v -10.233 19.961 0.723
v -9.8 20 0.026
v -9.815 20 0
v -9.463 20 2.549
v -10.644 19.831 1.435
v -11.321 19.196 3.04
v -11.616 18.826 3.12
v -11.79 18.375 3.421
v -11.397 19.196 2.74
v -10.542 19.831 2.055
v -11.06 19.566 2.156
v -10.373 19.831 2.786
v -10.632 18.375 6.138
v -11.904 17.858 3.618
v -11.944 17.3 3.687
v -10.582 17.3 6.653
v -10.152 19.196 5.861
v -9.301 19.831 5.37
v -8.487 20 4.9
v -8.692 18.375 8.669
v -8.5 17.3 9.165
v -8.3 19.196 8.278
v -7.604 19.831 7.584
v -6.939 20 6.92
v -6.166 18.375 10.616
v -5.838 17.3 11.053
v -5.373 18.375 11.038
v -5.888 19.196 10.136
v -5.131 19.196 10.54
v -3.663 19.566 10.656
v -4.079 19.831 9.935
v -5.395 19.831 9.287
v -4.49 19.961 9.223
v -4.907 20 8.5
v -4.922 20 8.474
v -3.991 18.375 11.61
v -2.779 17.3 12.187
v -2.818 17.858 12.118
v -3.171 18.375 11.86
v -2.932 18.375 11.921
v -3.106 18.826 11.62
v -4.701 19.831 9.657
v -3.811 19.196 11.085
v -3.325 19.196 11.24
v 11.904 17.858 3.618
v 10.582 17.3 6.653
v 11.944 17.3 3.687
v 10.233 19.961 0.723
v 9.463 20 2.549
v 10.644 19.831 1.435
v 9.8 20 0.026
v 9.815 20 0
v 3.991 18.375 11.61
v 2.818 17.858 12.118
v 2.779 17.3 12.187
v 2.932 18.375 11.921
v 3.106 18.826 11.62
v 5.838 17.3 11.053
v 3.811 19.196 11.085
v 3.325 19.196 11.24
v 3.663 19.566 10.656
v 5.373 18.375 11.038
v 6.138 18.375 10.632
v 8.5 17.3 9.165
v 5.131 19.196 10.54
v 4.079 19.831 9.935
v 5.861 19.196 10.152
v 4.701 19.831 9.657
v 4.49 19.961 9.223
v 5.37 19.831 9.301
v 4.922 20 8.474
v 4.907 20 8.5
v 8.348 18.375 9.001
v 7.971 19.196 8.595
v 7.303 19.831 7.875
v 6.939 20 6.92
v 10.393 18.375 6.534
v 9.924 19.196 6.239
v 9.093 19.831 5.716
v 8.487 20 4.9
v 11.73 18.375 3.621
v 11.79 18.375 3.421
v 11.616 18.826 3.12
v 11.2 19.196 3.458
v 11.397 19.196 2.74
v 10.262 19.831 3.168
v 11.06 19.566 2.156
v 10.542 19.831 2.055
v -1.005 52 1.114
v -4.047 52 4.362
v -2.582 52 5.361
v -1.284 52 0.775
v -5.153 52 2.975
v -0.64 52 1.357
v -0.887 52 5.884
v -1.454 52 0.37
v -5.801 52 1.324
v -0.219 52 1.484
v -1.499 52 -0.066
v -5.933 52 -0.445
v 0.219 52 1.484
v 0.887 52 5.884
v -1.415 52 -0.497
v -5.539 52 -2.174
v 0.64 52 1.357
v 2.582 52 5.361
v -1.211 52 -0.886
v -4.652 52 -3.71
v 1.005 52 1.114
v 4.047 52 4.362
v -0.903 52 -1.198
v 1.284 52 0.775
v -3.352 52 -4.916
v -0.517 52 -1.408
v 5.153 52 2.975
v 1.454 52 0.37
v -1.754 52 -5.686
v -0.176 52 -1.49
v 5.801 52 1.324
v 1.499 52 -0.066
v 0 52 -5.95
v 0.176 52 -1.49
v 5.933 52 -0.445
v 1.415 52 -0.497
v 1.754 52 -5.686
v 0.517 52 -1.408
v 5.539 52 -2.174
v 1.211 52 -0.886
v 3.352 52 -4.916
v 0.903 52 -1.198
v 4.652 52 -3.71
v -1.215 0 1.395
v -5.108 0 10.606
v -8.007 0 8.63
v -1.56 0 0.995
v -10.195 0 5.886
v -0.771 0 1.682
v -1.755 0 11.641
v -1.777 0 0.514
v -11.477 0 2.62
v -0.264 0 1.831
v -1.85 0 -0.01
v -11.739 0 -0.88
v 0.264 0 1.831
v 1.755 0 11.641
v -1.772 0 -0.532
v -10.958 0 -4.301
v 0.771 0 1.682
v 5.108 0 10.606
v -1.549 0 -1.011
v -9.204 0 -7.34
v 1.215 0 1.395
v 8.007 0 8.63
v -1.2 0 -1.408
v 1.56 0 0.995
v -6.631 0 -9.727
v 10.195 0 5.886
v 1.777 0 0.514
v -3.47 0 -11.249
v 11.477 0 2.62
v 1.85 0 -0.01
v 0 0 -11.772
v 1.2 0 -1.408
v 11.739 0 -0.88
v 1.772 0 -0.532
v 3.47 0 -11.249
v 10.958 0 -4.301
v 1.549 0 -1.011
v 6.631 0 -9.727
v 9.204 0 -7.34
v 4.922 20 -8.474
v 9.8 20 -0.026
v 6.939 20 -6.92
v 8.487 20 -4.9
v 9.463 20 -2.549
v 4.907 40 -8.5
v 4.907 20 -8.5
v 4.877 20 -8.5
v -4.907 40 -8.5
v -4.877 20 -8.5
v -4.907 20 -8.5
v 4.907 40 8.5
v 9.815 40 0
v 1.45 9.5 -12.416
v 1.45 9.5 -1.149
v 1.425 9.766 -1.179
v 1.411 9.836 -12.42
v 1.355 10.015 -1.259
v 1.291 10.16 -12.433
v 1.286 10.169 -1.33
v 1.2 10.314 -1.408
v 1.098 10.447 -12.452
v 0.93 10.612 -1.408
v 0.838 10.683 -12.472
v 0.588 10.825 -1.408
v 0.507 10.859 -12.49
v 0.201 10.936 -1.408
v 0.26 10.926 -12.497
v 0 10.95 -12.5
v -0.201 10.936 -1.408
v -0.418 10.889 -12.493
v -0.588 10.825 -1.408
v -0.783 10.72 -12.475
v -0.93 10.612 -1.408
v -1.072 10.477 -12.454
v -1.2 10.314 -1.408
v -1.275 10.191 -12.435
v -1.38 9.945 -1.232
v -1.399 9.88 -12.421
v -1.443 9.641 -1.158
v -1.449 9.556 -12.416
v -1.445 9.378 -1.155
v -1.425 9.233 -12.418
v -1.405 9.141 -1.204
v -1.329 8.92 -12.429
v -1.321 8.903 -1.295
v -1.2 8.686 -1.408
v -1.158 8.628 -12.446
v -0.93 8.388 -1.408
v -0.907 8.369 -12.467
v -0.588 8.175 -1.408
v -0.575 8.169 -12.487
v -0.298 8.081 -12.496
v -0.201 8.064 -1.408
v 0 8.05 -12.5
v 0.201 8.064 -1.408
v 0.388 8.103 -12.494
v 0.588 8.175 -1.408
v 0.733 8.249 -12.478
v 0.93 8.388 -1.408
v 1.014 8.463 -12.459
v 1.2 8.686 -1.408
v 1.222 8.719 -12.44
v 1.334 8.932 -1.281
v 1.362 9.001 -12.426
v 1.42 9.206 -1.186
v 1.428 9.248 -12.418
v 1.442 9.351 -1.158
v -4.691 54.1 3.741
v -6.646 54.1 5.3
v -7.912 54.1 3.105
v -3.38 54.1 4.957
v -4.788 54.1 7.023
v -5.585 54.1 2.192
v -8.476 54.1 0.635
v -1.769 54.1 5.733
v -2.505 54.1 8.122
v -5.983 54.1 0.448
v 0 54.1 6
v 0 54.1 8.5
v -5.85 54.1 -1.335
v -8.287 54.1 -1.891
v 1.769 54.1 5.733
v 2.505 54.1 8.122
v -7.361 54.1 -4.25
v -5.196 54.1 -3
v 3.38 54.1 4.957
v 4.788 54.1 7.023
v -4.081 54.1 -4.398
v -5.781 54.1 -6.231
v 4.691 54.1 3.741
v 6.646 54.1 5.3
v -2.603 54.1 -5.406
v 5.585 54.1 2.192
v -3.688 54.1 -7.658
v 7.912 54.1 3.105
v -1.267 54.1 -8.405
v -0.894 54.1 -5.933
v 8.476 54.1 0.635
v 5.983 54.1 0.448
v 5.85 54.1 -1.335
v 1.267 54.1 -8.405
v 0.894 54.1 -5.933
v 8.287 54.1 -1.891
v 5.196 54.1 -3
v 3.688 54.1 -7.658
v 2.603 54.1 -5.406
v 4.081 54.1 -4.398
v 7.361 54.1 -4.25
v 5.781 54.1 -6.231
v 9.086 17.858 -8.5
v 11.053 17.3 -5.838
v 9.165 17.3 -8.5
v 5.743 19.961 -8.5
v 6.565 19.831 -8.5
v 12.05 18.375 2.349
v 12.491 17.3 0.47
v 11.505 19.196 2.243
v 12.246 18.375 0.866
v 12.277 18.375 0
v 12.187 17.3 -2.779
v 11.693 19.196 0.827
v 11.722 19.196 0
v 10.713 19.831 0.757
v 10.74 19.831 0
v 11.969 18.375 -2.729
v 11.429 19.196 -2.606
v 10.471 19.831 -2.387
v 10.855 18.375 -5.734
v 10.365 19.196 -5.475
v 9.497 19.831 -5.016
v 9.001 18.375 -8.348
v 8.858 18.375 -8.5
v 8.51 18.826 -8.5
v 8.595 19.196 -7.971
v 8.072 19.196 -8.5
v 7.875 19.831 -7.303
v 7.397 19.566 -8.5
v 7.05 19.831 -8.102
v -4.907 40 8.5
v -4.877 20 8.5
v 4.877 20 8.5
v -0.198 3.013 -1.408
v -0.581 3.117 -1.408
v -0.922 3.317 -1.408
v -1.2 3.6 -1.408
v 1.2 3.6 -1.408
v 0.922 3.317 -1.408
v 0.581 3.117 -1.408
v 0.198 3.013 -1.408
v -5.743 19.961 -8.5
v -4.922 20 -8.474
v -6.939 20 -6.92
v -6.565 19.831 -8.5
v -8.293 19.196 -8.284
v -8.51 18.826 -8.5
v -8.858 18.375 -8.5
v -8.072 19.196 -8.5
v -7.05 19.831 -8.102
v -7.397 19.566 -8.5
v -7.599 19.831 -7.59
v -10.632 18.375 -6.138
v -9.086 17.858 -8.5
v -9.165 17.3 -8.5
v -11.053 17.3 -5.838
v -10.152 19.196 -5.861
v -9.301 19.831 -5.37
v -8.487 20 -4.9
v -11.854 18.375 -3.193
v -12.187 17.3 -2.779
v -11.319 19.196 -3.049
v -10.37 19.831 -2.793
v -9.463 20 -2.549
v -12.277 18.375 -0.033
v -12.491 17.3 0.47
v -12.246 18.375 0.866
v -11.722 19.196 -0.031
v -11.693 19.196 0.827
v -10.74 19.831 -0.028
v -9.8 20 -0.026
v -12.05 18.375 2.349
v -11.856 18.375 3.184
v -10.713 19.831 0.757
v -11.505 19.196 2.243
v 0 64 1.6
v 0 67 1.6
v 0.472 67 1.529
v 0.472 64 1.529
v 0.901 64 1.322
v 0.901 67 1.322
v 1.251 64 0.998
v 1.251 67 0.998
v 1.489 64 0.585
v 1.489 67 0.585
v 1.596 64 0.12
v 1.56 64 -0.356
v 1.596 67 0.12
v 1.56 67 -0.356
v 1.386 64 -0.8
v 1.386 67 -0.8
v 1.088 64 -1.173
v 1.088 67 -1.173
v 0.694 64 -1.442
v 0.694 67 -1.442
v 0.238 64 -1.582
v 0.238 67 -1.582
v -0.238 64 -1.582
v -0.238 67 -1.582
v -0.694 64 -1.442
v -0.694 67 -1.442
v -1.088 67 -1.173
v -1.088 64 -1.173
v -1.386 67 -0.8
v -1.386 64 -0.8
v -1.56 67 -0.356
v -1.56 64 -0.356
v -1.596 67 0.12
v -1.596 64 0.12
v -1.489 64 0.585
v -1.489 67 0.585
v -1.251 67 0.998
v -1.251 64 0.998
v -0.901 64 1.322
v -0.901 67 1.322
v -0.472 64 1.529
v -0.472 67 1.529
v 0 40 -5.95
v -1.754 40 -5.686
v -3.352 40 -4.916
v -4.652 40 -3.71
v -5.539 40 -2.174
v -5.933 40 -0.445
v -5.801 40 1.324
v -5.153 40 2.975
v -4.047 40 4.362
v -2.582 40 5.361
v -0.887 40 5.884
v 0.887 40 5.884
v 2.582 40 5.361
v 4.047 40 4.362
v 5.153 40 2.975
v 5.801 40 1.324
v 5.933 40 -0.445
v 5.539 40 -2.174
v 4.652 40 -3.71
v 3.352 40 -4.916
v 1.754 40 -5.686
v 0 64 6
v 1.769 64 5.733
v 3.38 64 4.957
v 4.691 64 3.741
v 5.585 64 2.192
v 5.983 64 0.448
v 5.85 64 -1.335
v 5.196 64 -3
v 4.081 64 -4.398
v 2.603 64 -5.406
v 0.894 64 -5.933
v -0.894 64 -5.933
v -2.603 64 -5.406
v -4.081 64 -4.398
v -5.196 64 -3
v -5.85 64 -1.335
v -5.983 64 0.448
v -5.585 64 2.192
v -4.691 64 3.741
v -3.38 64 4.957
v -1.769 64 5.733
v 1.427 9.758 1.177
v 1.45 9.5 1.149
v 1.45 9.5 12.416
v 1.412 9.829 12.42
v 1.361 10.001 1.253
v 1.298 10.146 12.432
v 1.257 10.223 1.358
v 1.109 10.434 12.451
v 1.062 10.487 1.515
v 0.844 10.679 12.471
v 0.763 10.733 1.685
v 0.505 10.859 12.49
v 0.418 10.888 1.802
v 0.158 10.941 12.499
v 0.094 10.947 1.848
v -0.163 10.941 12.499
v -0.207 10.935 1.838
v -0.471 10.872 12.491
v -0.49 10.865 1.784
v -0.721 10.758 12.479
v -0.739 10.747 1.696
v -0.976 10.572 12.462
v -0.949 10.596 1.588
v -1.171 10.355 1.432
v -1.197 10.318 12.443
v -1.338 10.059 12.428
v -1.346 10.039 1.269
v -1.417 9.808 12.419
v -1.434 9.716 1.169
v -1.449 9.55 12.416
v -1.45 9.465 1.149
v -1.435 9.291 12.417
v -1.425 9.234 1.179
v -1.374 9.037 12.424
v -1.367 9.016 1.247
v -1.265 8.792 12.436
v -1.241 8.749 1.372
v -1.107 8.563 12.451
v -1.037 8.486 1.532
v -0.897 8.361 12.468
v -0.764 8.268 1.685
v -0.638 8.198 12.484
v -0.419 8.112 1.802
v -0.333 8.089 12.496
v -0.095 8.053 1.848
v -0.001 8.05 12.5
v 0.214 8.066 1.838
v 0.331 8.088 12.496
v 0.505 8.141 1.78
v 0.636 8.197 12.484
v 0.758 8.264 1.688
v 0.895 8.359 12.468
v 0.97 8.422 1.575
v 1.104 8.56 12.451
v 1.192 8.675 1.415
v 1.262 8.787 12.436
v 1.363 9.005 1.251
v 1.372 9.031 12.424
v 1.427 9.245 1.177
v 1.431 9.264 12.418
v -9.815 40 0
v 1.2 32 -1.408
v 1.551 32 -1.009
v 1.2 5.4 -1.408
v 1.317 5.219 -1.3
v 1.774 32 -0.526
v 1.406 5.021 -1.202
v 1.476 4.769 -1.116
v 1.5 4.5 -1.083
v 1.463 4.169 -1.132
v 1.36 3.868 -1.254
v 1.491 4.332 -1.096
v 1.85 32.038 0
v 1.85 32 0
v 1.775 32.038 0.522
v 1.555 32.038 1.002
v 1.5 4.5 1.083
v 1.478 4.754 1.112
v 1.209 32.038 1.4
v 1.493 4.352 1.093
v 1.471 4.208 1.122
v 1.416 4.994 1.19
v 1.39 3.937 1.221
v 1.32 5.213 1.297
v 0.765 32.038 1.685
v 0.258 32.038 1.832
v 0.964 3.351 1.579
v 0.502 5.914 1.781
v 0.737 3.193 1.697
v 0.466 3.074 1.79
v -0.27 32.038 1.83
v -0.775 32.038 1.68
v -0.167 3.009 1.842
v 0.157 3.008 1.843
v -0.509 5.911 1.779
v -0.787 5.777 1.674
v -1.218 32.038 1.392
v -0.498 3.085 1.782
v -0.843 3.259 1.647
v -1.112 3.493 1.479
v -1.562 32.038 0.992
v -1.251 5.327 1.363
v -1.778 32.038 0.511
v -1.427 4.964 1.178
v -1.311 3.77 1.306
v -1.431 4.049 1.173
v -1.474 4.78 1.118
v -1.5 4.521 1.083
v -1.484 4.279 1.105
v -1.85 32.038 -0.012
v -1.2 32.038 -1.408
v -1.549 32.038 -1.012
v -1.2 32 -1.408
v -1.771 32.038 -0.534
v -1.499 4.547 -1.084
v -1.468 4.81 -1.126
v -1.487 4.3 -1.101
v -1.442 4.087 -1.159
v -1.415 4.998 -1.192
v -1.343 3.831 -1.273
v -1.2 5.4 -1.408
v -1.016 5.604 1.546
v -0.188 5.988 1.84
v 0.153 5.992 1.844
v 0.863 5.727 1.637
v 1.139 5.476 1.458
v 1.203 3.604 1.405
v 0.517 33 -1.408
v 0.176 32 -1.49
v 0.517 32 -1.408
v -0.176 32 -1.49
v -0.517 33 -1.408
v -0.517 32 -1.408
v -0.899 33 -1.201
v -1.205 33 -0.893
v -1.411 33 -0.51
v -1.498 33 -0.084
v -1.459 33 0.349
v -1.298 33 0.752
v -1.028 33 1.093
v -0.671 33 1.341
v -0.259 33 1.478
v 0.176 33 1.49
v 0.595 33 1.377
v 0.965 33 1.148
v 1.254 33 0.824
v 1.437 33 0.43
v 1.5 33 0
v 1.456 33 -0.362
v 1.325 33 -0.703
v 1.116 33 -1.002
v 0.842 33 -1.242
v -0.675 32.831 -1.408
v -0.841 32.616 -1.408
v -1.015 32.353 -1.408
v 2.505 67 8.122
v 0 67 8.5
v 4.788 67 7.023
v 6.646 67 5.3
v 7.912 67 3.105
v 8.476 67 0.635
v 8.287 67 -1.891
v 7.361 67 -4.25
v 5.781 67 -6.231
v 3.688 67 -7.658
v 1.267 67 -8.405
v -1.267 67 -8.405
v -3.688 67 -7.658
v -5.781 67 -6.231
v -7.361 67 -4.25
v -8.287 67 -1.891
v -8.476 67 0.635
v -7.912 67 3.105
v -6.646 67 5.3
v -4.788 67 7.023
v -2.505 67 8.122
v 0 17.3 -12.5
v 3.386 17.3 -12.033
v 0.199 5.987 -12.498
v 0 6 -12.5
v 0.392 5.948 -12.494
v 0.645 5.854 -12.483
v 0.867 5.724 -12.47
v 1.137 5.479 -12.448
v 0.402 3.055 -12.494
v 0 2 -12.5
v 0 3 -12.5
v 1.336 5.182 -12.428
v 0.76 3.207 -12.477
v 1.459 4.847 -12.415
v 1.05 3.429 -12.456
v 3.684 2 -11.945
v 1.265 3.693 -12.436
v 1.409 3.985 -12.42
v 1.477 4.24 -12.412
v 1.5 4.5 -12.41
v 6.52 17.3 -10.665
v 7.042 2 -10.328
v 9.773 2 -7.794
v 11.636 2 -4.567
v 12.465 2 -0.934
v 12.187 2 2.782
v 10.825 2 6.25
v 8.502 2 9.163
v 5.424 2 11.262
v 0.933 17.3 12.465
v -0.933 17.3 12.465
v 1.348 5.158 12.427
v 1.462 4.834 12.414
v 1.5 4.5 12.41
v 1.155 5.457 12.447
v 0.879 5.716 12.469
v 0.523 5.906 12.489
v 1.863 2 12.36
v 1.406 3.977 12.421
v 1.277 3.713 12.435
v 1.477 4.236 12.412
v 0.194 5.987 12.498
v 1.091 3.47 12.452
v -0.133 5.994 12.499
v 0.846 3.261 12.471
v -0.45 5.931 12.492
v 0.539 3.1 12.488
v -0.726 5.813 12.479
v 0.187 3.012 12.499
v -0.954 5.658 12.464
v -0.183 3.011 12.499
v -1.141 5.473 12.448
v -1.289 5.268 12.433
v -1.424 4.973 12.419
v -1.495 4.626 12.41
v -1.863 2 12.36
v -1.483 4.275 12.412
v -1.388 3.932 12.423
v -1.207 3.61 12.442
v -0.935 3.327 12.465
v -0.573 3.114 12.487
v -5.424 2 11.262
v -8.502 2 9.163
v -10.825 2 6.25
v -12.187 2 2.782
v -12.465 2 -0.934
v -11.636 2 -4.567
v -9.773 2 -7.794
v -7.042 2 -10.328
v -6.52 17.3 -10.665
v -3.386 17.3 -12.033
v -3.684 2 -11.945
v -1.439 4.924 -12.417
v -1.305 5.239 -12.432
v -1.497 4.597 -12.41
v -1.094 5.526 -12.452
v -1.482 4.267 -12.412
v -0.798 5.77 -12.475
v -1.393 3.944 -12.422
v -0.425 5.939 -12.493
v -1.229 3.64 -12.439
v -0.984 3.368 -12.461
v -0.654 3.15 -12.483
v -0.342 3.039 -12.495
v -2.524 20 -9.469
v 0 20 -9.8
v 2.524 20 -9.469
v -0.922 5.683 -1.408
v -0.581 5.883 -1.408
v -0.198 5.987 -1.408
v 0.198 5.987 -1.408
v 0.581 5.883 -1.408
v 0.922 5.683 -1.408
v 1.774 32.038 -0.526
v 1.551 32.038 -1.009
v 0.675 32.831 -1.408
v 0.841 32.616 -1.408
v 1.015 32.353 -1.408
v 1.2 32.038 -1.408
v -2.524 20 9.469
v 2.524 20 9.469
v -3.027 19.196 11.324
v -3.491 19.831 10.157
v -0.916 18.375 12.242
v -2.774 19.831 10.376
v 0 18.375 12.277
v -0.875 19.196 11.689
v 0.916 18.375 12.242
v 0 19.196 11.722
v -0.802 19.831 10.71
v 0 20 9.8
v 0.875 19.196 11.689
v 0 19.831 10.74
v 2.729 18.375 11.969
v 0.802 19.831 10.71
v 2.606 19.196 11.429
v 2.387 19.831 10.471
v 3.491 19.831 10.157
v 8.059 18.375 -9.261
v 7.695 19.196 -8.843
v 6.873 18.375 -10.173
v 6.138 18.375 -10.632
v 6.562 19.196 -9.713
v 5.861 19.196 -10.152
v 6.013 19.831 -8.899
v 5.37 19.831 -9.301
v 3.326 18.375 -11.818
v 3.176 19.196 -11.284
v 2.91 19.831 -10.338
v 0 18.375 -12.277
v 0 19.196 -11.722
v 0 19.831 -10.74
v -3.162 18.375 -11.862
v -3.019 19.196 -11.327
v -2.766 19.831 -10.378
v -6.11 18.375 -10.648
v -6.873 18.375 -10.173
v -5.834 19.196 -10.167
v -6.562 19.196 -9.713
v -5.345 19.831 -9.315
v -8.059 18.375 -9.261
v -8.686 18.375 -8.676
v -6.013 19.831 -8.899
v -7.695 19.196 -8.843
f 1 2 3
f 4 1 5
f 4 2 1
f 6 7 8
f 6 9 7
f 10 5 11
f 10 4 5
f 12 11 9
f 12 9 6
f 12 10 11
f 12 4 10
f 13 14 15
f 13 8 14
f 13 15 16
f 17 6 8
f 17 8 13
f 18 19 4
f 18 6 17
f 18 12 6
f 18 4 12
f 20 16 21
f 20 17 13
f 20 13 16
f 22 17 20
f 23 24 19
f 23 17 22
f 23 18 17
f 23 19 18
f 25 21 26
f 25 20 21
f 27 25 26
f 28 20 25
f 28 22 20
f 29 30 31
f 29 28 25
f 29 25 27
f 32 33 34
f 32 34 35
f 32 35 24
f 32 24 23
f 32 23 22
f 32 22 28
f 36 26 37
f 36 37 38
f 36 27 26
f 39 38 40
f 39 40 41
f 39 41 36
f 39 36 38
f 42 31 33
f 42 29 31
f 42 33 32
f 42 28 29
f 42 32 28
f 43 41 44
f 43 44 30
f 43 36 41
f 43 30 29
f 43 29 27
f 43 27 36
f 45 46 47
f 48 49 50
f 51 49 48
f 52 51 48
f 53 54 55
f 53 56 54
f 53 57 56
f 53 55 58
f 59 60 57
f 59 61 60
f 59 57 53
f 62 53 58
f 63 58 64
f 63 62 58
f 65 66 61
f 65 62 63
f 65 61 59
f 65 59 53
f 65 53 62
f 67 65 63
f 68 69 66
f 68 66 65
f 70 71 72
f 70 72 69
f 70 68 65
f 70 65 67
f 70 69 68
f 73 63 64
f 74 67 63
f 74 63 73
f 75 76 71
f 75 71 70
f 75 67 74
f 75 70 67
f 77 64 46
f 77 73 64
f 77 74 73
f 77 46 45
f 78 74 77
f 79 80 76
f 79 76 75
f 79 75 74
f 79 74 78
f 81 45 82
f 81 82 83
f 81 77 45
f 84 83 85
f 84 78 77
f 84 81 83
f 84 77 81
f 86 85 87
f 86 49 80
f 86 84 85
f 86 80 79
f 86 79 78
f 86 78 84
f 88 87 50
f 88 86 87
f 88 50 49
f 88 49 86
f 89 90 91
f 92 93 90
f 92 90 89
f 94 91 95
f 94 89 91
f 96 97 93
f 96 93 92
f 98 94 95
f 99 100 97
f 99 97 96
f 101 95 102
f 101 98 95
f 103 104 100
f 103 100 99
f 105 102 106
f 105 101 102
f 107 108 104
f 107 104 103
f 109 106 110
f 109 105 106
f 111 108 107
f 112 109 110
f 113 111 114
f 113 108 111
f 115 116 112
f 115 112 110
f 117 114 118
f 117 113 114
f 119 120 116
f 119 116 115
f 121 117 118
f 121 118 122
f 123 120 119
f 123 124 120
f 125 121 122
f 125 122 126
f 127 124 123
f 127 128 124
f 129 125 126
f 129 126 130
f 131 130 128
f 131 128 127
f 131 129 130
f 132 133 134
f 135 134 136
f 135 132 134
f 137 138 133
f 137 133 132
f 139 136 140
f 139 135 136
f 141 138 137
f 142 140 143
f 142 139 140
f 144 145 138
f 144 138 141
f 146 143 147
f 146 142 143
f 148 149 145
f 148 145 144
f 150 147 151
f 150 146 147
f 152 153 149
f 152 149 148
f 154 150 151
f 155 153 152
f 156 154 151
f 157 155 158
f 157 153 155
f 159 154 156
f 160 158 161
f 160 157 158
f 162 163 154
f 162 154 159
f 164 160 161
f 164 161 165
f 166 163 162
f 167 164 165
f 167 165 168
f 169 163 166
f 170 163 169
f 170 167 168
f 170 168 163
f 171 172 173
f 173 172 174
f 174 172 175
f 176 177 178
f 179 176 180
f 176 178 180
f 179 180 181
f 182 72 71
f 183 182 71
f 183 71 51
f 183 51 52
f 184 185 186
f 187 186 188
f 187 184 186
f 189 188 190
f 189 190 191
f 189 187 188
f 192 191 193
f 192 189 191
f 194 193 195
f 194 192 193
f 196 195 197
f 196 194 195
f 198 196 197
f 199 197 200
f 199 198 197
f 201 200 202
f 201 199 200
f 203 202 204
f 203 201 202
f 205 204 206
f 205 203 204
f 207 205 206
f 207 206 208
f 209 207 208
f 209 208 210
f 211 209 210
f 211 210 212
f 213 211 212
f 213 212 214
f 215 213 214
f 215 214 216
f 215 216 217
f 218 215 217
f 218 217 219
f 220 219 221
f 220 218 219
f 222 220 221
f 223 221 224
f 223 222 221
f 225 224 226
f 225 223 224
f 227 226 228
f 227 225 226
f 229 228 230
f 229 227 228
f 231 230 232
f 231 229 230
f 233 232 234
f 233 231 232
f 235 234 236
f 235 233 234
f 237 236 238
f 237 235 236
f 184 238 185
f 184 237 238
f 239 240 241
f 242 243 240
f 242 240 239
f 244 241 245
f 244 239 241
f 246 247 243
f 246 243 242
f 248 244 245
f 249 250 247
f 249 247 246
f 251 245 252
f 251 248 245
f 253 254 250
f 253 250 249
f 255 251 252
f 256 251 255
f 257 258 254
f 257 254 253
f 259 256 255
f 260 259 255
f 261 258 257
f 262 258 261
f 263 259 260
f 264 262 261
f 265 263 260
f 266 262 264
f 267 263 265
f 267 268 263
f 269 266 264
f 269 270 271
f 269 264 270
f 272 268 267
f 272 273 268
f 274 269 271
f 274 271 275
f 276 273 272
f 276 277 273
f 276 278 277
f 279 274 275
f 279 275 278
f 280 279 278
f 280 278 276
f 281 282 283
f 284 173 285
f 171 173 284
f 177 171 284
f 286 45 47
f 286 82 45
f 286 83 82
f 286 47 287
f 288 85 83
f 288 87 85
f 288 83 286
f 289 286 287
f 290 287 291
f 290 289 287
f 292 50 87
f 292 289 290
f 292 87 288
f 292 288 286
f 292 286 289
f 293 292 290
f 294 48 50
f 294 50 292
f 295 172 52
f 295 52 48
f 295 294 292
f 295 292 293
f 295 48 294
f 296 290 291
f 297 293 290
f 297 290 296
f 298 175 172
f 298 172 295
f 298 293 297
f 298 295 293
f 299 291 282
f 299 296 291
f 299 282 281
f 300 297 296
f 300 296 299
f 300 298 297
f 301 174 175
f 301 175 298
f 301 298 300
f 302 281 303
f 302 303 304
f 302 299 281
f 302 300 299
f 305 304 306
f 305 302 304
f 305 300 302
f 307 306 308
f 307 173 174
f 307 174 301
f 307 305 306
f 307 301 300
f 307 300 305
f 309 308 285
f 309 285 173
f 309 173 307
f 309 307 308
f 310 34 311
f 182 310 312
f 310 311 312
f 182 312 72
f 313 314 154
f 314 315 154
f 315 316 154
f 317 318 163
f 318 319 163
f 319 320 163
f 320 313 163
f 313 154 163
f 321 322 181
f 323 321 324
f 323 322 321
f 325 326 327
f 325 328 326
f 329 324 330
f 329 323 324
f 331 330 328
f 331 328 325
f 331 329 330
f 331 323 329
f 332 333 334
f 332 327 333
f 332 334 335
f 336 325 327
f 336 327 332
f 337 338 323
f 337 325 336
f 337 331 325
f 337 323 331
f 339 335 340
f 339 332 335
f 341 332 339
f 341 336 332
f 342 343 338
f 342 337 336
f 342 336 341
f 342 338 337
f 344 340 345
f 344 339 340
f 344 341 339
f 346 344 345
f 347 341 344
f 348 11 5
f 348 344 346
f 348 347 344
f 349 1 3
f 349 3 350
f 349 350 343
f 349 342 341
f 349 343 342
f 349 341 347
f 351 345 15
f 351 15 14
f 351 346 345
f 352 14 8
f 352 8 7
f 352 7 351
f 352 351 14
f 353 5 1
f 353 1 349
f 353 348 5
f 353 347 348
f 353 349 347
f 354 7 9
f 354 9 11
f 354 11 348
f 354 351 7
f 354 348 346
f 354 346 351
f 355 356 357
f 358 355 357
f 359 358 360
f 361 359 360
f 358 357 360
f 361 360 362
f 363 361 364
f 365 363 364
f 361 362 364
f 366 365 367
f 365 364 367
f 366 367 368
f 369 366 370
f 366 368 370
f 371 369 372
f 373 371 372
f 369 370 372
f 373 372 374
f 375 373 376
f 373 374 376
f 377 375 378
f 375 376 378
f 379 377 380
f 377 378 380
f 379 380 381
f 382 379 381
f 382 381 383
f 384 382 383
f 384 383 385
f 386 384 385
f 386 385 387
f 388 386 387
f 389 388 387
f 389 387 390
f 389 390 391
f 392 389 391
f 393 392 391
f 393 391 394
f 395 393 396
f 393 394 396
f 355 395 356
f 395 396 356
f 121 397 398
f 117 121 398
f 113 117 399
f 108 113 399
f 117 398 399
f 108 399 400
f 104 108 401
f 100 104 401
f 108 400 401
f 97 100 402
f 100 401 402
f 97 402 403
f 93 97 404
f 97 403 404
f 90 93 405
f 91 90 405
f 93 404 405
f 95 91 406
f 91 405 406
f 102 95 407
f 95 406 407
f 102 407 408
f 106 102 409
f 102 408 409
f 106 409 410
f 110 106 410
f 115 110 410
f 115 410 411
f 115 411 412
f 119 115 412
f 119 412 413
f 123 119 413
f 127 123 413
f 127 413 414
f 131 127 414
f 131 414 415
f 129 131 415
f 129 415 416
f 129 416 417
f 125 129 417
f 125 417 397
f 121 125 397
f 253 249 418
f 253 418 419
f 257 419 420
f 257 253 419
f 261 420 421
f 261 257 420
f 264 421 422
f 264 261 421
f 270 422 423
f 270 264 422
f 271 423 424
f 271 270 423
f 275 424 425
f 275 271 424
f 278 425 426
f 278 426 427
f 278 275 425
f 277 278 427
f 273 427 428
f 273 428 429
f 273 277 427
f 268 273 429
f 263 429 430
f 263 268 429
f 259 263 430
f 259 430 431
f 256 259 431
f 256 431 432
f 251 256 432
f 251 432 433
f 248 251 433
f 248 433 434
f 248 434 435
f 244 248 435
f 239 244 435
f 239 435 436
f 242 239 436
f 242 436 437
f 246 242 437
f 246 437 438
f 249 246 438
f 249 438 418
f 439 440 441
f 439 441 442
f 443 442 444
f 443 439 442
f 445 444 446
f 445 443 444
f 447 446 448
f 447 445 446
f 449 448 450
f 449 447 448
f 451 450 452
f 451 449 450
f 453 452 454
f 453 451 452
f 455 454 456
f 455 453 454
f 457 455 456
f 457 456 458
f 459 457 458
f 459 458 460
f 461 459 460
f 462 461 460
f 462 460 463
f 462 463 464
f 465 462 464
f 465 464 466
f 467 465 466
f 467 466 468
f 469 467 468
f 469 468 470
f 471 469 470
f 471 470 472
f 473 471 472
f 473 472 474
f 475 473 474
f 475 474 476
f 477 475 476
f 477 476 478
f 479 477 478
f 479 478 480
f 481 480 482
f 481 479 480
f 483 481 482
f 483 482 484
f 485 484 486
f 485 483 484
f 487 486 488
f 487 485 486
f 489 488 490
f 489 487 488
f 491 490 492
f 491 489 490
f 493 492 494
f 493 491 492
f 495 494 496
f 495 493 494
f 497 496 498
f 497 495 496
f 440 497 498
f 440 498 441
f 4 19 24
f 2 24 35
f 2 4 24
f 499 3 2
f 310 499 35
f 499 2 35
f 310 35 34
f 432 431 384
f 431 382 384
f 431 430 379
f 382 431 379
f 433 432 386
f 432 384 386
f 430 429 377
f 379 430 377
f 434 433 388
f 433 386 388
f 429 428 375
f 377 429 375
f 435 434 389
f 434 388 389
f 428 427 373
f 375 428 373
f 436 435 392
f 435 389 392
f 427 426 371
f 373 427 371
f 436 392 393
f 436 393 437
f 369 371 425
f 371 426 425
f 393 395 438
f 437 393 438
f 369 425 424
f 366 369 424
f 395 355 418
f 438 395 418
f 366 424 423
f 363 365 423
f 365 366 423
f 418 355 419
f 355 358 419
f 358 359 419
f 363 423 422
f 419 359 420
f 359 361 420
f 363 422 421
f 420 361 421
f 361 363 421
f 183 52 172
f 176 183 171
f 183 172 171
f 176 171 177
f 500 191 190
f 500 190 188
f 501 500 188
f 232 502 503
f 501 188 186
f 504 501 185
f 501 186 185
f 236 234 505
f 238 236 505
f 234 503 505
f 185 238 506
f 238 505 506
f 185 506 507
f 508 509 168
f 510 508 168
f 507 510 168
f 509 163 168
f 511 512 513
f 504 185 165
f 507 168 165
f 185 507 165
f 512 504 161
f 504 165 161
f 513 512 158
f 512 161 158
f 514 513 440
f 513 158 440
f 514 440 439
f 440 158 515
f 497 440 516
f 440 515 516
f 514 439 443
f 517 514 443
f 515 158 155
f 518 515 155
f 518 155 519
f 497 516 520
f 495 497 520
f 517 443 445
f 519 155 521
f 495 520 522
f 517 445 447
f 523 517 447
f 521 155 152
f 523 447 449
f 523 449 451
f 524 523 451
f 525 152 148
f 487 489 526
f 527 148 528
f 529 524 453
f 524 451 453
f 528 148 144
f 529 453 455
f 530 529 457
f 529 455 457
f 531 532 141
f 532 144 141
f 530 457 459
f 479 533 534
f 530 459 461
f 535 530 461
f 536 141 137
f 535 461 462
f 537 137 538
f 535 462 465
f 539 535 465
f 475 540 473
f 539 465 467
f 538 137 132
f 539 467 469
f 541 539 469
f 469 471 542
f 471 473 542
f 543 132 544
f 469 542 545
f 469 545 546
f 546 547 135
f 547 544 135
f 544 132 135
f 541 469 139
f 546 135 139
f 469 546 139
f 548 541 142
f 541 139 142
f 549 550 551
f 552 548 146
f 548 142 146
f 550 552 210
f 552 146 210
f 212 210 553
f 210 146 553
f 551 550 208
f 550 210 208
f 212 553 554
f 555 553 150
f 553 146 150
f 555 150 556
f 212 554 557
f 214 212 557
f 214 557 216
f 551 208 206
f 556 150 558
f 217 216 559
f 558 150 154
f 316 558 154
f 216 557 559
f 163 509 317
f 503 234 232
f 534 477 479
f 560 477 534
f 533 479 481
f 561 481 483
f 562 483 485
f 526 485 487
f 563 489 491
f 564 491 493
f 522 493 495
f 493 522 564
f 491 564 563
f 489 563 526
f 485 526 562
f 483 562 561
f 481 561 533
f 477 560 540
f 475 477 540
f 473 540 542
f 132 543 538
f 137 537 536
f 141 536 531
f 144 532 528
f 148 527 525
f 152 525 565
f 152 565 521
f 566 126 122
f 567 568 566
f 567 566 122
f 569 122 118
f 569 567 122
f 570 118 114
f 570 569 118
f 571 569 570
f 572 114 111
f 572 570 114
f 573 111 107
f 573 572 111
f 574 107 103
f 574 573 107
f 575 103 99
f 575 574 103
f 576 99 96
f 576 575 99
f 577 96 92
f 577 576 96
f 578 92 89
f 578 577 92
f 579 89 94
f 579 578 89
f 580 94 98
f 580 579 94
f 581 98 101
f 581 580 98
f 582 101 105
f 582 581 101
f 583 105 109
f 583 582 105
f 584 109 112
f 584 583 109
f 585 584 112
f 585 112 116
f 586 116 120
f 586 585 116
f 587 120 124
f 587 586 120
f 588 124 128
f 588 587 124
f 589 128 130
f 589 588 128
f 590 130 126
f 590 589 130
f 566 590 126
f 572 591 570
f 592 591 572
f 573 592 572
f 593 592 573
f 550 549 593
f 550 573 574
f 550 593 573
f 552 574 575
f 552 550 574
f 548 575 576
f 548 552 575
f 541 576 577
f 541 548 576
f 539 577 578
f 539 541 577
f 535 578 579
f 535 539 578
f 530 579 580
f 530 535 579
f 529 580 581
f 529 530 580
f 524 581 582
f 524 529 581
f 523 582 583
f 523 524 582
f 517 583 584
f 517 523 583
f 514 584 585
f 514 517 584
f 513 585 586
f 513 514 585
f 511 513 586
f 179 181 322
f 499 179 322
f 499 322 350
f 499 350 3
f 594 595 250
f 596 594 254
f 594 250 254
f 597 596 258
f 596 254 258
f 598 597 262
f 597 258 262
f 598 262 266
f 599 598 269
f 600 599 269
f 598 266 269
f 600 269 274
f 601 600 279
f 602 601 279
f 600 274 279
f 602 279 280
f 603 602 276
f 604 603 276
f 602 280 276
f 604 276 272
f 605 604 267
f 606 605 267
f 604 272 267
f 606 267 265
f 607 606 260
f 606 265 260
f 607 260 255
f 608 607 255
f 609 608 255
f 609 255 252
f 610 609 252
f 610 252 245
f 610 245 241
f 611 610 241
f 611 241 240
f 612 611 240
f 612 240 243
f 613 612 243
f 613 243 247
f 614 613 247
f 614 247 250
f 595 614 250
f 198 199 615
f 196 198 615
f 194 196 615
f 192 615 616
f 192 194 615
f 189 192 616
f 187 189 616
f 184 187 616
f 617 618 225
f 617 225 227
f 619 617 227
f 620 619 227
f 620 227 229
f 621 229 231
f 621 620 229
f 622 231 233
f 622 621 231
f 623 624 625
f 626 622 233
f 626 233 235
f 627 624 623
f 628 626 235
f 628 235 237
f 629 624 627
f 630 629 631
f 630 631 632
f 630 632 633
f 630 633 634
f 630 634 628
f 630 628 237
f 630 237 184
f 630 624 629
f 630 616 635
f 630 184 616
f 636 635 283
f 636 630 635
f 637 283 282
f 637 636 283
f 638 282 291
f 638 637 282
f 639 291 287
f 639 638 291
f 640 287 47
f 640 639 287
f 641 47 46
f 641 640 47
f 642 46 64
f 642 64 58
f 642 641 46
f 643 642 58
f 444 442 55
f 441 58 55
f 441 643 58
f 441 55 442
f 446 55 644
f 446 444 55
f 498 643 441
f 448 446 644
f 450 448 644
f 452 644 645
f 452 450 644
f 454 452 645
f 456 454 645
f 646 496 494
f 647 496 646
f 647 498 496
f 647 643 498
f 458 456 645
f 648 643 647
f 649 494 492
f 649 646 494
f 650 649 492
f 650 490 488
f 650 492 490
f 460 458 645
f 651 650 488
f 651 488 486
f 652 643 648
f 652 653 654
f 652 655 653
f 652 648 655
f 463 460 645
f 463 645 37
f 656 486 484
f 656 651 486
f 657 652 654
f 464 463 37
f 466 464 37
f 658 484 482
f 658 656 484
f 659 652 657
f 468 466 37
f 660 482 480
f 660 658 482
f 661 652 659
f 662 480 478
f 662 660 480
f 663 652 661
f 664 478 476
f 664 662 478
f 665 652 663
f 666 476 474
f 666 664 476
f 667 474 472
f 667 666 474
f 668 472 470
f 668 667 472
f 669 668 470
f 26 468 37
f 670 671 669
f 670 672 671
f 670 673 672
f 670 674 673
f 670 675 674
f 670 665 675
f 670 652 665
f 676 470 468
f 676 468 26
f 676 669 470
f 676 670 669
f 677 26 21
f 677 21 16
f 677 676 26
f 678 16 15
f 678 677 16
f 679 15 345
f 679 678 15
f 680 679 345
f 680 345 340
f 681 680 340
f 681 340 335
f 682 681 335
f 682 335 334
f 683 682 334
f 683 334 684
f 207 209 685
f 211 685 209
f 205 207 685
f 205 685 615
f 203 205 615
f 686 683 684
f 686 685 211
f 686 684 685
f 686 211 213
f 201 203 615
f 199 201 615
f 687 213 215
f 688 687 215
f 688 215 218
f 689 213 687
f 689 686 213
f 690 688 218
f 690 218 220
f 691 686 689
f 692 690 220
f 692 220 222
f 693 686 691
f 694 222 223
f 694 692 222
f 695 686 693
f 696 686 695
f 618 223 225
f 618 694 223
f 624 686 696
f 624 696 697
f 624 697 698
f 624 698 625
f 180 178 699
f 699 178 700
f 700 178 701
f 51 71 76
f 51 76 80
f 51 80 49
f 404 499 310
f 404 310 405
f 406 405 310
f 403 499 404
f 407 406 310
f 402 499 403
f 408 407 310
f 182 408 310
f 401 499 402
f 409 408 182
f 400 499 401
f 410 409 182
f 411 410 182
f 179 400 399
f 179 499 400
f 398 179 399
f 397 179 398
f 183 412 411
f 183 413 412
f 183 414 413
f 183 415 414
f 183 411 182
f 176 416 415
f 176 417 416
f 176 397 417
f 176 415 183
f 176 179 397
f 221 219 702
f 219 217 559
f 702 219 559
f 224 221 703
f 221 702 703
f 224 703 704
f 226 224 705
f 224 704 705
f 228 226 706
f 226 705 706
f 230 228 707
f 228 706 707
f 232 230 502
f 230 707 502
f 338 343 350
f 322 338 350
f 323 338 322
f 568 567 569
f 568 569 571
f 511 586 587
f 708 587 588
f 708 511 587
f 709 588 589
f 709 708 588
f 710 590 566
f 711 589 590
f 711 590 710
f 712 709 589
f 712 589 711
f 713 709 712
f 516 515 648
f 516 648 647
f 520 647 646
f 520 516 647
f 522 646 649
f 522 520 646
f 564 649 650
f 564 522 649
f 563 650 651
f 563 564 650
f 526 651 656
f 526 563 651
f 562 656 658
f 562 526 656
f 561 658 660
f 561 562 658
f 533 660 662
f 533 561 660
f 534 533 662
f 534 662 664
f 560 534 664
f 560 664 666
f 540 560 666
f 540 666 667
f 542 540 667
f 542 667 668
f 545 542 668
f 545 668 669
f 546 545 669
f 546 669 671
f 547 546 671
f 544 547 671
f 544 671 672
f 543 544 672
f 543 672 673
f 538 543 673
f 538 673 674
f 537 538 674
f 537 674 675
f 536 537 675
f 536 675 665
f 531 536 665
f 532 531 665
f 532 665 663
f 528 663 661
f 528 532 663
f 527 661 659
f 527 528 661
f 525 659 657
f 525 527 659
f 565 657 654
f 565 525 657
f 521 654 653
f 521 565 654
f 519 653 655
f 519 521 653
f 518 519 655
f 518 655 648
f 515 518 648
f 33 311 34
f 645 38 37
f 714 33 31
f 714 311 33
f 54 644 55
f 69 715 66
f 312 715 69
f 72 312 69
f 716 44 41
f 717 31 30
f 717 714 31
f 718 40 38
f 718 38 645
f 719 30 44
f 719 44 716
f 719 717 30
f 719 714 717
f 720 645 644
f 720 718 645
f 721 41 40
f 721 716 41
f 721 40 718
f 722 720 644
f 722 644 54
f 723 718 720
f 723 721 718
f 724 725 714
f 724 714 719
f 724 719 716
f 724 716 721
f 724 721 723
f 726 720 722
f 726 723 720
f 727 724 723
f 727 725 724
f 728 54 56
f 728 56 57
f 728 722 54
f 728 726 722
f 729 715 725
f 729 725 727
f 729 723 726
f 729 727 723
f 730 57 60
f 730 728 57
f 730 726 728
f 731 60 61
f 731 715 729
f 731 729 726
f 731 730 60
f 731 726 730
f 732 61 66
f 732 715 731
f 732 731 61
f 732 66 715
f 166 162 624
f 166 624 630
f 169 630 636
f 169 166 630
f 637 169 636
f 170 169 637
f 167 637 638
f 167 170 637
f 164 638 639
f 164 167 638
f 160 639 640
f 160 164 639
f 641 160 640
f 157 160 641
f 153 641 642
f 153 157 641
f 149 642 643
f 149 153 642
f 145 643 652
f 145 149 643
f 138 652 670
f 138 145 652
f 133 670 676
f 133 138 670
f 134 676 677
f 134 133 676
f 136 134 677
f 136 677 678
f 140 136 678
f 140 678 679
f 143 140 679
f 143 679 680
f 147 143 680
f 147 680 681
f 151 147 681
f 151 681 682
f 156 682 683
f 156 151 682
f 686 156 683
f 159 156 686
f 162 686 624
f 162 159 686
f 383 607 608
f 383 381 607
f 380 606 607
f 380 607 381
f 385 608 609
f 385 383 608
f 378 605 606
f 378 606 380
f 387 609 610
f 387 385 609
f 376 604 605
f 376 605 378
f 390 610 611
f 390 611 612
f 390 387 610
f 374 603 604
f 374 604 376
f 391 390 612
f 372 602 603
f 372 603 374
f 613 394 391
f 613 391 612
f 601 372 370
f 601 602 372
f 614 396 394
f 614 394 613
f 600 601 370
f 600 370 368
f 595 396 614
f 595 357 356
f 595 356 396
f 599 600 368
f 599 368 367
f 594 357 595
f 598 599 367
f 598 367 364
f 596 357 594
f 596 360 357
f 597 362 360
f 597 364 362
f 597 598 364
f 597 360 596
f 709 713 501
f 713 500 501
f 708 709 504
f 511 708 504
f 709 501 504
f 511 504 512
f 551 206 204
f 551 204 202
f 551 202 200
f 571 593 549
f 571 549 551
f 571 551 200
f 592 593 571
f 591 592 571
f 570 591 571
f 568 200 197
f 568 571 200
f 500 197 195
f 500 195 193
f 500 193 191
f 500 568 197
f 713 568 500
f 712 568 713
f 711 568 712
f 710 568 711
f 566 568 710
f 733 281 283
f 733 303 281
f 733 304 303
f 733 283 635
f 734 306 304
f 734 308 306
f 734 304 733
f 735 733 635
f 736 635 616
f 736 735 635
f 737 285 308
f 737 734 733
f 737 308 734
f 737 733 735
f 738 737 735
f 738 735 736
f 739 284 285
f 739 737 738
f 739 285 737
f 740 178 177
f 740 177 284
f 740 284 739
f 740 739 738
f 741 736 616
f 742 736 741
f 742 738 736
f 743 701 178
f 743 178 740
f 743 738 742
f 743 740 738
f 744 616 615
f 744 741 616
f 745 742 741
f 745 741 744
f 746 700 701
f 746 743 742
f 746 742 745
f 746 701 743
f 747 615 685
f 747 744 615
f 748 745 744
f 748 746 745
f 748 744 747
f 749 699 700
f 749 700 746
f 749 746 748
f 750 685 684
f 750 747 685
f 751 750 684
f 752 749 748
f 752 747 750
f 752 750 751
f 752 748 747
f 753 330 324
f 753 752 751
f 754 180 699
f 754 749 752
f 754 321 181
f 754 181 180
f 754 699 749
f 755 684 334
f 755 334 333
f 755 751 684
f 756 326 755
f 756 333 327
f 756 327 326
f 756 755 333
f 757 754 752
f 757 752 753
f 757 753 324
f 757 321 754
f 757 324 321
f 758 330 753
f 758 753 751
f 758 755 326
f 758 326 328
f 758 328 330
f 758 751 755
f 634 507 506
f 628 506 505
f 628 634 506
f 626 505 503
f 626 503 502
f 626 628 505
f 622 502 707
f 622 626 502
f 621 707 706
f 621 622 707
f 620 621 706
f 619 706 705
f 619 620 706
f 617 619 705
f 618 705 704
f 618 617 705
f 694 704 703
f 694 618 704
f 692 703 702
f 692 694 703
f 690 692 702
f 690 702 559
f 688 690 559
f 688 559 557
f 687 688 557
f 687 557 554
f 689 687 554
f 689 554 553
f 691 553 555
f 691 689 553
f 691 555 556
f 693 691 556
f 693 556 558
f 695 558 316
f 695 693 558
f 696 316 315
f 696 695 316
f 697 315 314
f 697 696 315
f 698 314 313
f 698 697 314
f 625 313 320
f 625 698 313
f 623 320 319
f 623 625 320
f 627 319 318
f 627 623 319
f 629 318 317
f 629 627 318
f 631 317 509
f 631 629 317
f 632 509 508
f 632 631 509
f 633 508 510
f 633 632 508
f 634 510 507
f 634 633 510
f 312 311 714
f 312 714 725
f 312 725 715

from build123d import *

# Parameters (mm, degrees)
SKETCH1_R               = 5.95
BOSS_EXTRUDE1_DEPTH     = 40
SKETCH1_2_R             = 5.95
BOSS_EXTRUDE2_DEPTH     = 52
SKETCH2_R               = 12.5
BOSS_EXTRUDE3_DEPTH     = 15
CUT_EXTRUDE1_DEPTH      = 55.922672914
CUT_EXTRUDE1_DEPTH_BACK = 55.922672914
SKETCH3_R               = 1.45
SKETCH3_R_2             = 1.5
SKETCH5_R               = 12.5
BOSS_EXTRUDE4_DEPTH     = 5
SKETCH7_R               = 8.5
SKETCH7_R_2             = 6
BOSS_EXTRUDE5_DEPTH     = 15
SKETCH8_R               = 6
SKETCH8_R_2             = 1.6
BOSS_EXTRUDE6_DEPTH     = 3
SKETCH9_R               = 8.5
CUT_EXTRUDE4_DEPTH      = 2.1
BOSS_EXTRUDE7_START     = -20
SKETCH6_R               = 1.85
SKETCH6_R_2             = 1.5
BOSS_EXTRUDE7_DEPTH     = 20
CUT_EXTRUDE5_START      = -20
CUT_EXTRUDE5_DEPTH      = 20
CHAMFER1_SIZE           = 1
CHAMFER1_SIZE_2         = 0.363970234
FILLET1_R               = 2.7
CHAMFER2_SIZE           = 2
CHAMFER2_SIZE2          = 0.727940469


with BuildPart() as part:
    # Sketch1 → Boss-Extrude1 (new body)
    with BuildSketch(Plane(origin=(0, 0, 0), x_dir=(1, 0, 0), z_dir=(0, 1, 0))):
        Polygon((-4.907477288, -8.5), (4.907477288, -8.5), (9.814954576, 0), (4.907477288, 8.5), (-4.907477288, 8.5), (-9.814954576, 0), align=None)
        with Locations(Location((0, 0, 0), (0, 0, 270))):
            Circle(SKETCH1_R, mode=Mode.SUBTRACT)
    extrude(amount=BOSS_EXTRUDE1_DEPTH)

    # Sketch1<2> → Boss-Extrude2 (add)
    with BuildSketch(Plane(origin=(0, 0, 0), x_dir=(1, 0, 0), z_dir=(0, 1, 0))):
        with Locations(Location((0, 0, 0), (0, 0, 90))):
            Circle(SKETCH1_2_R)
        with BuildLine():
            Line((-1.2, 1.408012784), (1.2, 1.408012784))
            ThreePointArc((1.2, 1.408012784), (0, -1.85), (-1.2, 1.408012784))
        make_face(mode=Mode.SUBTRACT)
    extrude(amount=BOSS_EXTRUDE2_DEPTH)

    # Sketch2 → Boss-Extrude3 (add)
    with BuildSketch(Plane.XZ):
        with Locations(Location((0, 0, 0), (0, 0, 270))):
            Circle(SKETCH2_R)
        Polygon((4.907477288, 8.5), (-4.907477288, 8.5), (-9.814954576, 0), (-4.907477288, -8.5), (4.907477288, -8.5), (9.814954576, 0), align=None, mode=Mode.SUBTRACT)
    extrude(amount=-BOSS_EXTRUDE3_DEPTH)

    # Sketch3 → Cut-Extrude1 (cut, two sides: drawn at the far end of the back side and taken through both)
    with BuildSketch(Plane.XY.offset(-CUT_EXTRUDE1_DEPTH_BACK)):
        with Locations((0, 9.5)):
            Circle(SKETCH3_R)
        with Locations((0, 4.5)):
            Circle(SKETCH3_R_2)
    extrude(amount=CUT_EXTRUDE1_DEPTH + CUT_EXTRUDE1_DEPTH_BACK, mode=Mode.SUBTRACT)

    # Sketch5 → Boss-Extrude4 (add)
    with BuildSketch(Plane(origin=(0, 15, 0), x_dir=(1, 0, 0), z_dir=(0, 1, 0))):
        with Locations(Location((0, 0, 0), (0, 0, 90))):
            Circle(SKETCH5_R)
        Polygon((9.814954576, 0), (4.907477288, -8.5), (-4.907477288, -8.5), (-9.814954576, 0), (-4.907477288, 8.5), (4.907477288, 8.5), align=None, mode=Mode.SUBTRACT)
    extrude(amount=BOSS_EXTRUDE4_DEPTH)

    # Sketch6 → Boss-Extrude7 (add)
    with BuildSketch(Plane(origin=(0, 52, 0), x_dir=(1, 0, 0), z_dir=(0, 1, 0)).offset(BOSS_EXTRUDE7_START)):
        Circle(SKETCH6_R)
        Circle(SKETCH6_R_2, mode=Mode.SUBTRACT)
    extrude(amount=BOSS_EXTRUDE7_DEPTH)

    # Sketch6<2> → Cut-Extrude5 (cut)
    with BuildSketch(Plane(origin=(0, 52, 0), x_dir=(1, 0, 0), z_dir=(0, 1, 0)).offset(CUT_EXTRUDE5_START)):
        with BuildLine():
            Line((-0.517204022, 1.408012784), (0.517204022, 1.408012784))
            ThreePointArc((0.517204022, 1.408012784), (0, 1.5), (-0.517204022, 1.408012784))
        make_face()
        with BuildLine():
            ThreePointArc((1.5, 0), (1.230001226, 0.858543525), (0.517204022, 1.408012784))
            Line((0.517204022, 1.408012784), (-0.517204022, 1.408012784))
            ThreePointArc((-0.517204022, 1.408012784), (-0.858543525, -1.230001226), (1.5, 0))
        make_face()
    extrude(amount=CUT_EXTRUDE5_DEPTH, mode=Mode.SUBTRACT)

    # Chamfer1
    # the kernel refuses this chamfer: 1, 0.363970234 mm, written as the material it takes off along each edge
    with BuildSketch(Plane(origin=(0, 32, 0), x_dir=(0.9823803136047933, 0, -0.1868928020062522), z_dir=(0.1868928020062522, 0, 0.9823803136047933))) as chamfer1_piece_1_section:
        Polygon((1.5, CHAMFER1_SIZE), (1.5 + CHAMFER1_SIZE_2, 0), (1.5, 0), align=None)
    chamfer1_piece_1 = revolve(axis=Axis((0, 32, 0), (0, 1, 0)), revolution_arc=349.228493073, mode=Mode.PRIVATE)
    chamfer1_piece_1 = chamfer1_piece_1 & Plane(origin=(0, 32.340011658, 0), x_dir=(0.6486486486486487, 0, -0.7610879913691202), z_dir=(0, -1, 0)) * Cylinder(1.85, 8, mode=Mode.PRIVATE)
    chamfer1_piece_1 = split(chamfer1_piece_1, bisect_by=Plane(origin=(1.266565325, 32.340011658, -1.408012784), z_dir=(0, 0, 1)), keep=Keep.TOP, mode=Mode.PRIVATE)
    add(chamfer1_piece_1, mode=Mode.SUBTRACT)
    with BuildSketch(Plane(origin=(0, 32, 0), x_dir=(1, 0, 0), z_dir=(0, 0, 1))) as chamfer1_piece_2_section:
        Polygon((1.5, CHAMFER1_SIZE), (1.5 + CHAMFER1_SIZE_2, 0), (1.5, 0), align=None)
    chamfer1_piece_2 = revolve(axis=Axis((0, 32, 0), (0, 1, 0)), revolution_arc=168.945149076, mode=Mode.PRIVATE)
    chamfer1_piece_2 = chamfer1_piece_2 & Plane(origin=(0, 32.337814983, 0), x_dir=(0.6486486486486487, 0, -0.7610879913691202), z_dir=(0, -1, 0)) * Cylinder(1.85, 8, mode=Mode.PRIVATE)
    chamfer1_piece_2 = split(chamfer1_piece_2, bisect_by=Plane(origin=(1.32853584, 32.337814983, -1.408012784), z_dir=(0, 0, 1)), keep=Keep.TOP, mode=Mode.PRIVATE)
    add(chamfer1_piece_2, mode=Mode.SUBTRACT)

    # Fillet1
    # the kernel refuses this fillet: 2.7 mm, written as the material it takes off along each edge
    with BuildSketch(Plane(origin=(0, 20, 0), x_dir=(0, 0, -1), z_dir=(1, 0, 0))) as fillet1_piece_1_section:
        with BuildLine():
            CenterArc((12.5 - FILLET1_R, -FILLET1_R), FILLET1_R, 0, 90)
            Line((12.5, -FILLET1_R), (12.5, 0))
            Line((12.5, 0), (12.5 - FILLET1_R, 0))
        make_face()
    fillet1_piece_1 = revolve(axis=Axis((0, 20, 0), (0, 1, 0)), mode=Mode.PRIVATE)
    fillet1_piece_1 = split(fillet1_piece_1, bisect_by=Plane(origin=(1.041e-06, 19.432642302, -8.5), z_dir=(0, 0, -1)), keep=Keep.TOP, mode=Mode.PRIVATE)
    add(fillet1_piece_1, mode=Mode.SUBTRACT)
    with BuildSketch(Plane(origin=(0, 20, 0), x_dir=(0, 0, -1), z_dir=(1, 0, 0))) as fillet1_piece_2_section:
        with BuildLine():
            CenterArc((12.5 - FILLET1_R, -FILLET1_R), FILLET1_R, 0, 90)
            Line((12.5, -FILLET1_R), (12.5, 0))
            Line((12.5, 0), (12.5 - FILLET1_R, 0))
        make_face()
    fillet1_piece_2 = revolve(axis=Axis((0, 20, 0), (0, 1, 0)), mode=Mode.PRIVATE)
    fillet1_piece_2 = split(fillet1_piece_2, bisect_by=Plane(origin=(-7.361214724, 19.432641737, -4.250002093), z_dir=(-0.8660254037844416, 0, -0.49999999999999484)), keep=Keep.TOP, mode=Mode.PRIVATE)
    add(fillet1_piece_2, mode=Mode.SUBTRACT)
    with BuildSketch(Plane(origin=(0, 20, 0), x_dir=(0, 0, -1), z_dir=(1, 0, 0))) as fillet1_piece_3_section:
        with BuildLine():
            CenterArc((12.5 - FILLET1_R, -FILLET1_R), FILLET1_R, 0, 90)
            Line((12.5, -FILLET1_R), (12.5, 0))
            Line((12.5, 0), (12.5 - FILLET1_R, 0))
        make_face()
    fillet1_piece_3 = revolve(axis=Axis((0, 20, 0), (0, 1, 0)), mode=Mode.PRIVATE)
    fillet1_piece_3 = split(fillet1_piece_3, bisect_by=Plane(origin=(7.361217141, 19.432641737, -4.249997907), z_dir=(0.8660254037844382, 0, -0.5000000000000011)), keep=Keep.TOP, mode=Mode.PRIVATE)
    add(fillet1_piece_3, mode=Mode.SUBTRACT)
    with BuildSketch(Plane(origin=(0, 20, 0), x_dir=(0, 0, -1), z_dir=(1, 0, 0))) as fillet1_piece_4_section:
        with BuildLine():
            CenterArc((12.5 - FILLET1_R, -FILLET1_R), FILLET1_R, 0, 90)
            Line((12.5, -FILLET1_R), (12.5, 0))
            Line((12.5, 0), (12.5 - FILLET1_R, 0))
        make_face()
    fillet1_piece_4 = revolve(axis=Axis((0, 20, 0), (0, 1, 0)), mode=Mode.PRIVATE)
    fillet1_piece_4 = split(fillet1_piece_4, bisect_by=Plane(origin=(-7.361217141, 19.432641737, 4.249997907), z_dir=(-0.8660254037844347, 0, 0.500000000000007)), keep=Keep.TOP, mode=Mode.PRIVATE)
    add(fillet1_piece_4, mode=Mode.SUBTRACT)
    with BuildSketch(Plane(origin=(0, 20, 0), x_dir=(0, 0, -1), z_dir=(1, 0, 0))) as fillet1_piece_5_section:
        with BuildLine():
            CenterArc((12.5 - FILLET1_R, -FILLET1_R), FILLET1_R, 0, 90)
            Line((12.5, -FILLET1_R), (12.5, 0))
            Line((12.5, 0), (12.5 - FILLET1_R, 0))
        make_face()
    fillet1_piece_5 = revolve(axis=Axis((0, 20, 0), (0, 1, 0)), mode=Mode.PRIVATE)
    fillet1_piece_5 = split(fillet1_piece_5, bisect_by=Plane(origin=(7.361214724, 19.432641737, 4.250002093), z_dir=(0.8660254037844416, 0, 0.49999999999999495)), keep=Keep.TOP, mode=Mode.PRIVATE)
    add(fillet1_piece_5, mode=Mode.SUBTRACT)
    with BuildSketch(Plane(origin=(0, 20, 0), x_dir=(0, 0, -1), z_dir=(1, 0, 0))) as fillet1_piece_6_section:
        with BuildLine():
            CenterArc((12.5 - FILLET1_R, -FILLET1_R), FILLET1_R, 0, 90)
            Line((12.5, -FILLET1_R), (12.5, 0))
            Line((12.5, 0), (12.5 - FILLET1_R, 0))
        make_face()
    fillet1_piece_6 = revolve(axis=Axis((0, 20, 0), (0, 1, 0)), mode=Mode.PRIVATE)
    fillet1_piece_6 = split(fillet1_piece_6, bisect_by=Plane(origin=(-2.417e-06, 19.432641737, 8.5), z_dir=(0, 0, 1)), keep=Keep.TOP, mode=Mode.PRIVATE)
    add(fillet1_piece_6, mode=Mode.SUBTRACT)

    # Chamfer2
    chamfer2_edges = [part.edges().sort_by_distance(p)[0] for p in [
        (0, 0, 12.5),
    ]]
    chamfer2_side = [part.faces().sort_by_distance(p)[0] for p in [
        (0, 7.5, 12.5),
    ]]
    chamfer(chamfer2_edges, length=CHAMFER2_SIZE, length2=CHAMFER2_SIZE2, reference=chamfer2_side[0])


with BuildPart() as body_2:
    # Sketch7 → Boss-Extrude5 (new body)
    with BuildSketch(Plane(origin=(0, 52, 0), x_dir=(1, 0, 0), z_dir=(0, 1, 0))):
        with Locations(Location((0, 0, 0), (0, 0, 270))):
            Circle(SKETCH7_R)
        with Locations(Location((0, 0, 0), (0, 0, 270))):
            Circle(SKETCH7_R_2, mode=Mode.SUBTRACT)
    extrude(amount=BOSS_EXTRUDE5_DEPTH)

    # Sketch8 → Boss-Extrude6 (add)
    with BuildSketch(Plane(origin=(0, 67, 0), x_dir=(1, 0, 0), z_dir=(0, 1, 0))):
        with Locations(Location((0, 0, 0), (0, 0, 270))):
            Circle(SKETCH8_R)
        with Locations(Location((0, 0, 0), (0, 0, 270))):
            Circle(SKETCH8_R_2, mode=Mode.SUBTRACT)
    extrude(amount=-BOSS_EXTRUDE6_DEPTH)

    # Sketch9 → Cut-Extrude4 (cut)
    with BuildSketch(Plane.XZ.offset(-52)):
        with Locations(Location((0, 0, 0), (0, 0, 270))):
            Circle(SKETCH9_R)
    extrude(amount=-CUT_EXTRUDE4_DEPTH, mode=Mode.SUBTRACT)


solid = Compound([part.part, body_2.part])
